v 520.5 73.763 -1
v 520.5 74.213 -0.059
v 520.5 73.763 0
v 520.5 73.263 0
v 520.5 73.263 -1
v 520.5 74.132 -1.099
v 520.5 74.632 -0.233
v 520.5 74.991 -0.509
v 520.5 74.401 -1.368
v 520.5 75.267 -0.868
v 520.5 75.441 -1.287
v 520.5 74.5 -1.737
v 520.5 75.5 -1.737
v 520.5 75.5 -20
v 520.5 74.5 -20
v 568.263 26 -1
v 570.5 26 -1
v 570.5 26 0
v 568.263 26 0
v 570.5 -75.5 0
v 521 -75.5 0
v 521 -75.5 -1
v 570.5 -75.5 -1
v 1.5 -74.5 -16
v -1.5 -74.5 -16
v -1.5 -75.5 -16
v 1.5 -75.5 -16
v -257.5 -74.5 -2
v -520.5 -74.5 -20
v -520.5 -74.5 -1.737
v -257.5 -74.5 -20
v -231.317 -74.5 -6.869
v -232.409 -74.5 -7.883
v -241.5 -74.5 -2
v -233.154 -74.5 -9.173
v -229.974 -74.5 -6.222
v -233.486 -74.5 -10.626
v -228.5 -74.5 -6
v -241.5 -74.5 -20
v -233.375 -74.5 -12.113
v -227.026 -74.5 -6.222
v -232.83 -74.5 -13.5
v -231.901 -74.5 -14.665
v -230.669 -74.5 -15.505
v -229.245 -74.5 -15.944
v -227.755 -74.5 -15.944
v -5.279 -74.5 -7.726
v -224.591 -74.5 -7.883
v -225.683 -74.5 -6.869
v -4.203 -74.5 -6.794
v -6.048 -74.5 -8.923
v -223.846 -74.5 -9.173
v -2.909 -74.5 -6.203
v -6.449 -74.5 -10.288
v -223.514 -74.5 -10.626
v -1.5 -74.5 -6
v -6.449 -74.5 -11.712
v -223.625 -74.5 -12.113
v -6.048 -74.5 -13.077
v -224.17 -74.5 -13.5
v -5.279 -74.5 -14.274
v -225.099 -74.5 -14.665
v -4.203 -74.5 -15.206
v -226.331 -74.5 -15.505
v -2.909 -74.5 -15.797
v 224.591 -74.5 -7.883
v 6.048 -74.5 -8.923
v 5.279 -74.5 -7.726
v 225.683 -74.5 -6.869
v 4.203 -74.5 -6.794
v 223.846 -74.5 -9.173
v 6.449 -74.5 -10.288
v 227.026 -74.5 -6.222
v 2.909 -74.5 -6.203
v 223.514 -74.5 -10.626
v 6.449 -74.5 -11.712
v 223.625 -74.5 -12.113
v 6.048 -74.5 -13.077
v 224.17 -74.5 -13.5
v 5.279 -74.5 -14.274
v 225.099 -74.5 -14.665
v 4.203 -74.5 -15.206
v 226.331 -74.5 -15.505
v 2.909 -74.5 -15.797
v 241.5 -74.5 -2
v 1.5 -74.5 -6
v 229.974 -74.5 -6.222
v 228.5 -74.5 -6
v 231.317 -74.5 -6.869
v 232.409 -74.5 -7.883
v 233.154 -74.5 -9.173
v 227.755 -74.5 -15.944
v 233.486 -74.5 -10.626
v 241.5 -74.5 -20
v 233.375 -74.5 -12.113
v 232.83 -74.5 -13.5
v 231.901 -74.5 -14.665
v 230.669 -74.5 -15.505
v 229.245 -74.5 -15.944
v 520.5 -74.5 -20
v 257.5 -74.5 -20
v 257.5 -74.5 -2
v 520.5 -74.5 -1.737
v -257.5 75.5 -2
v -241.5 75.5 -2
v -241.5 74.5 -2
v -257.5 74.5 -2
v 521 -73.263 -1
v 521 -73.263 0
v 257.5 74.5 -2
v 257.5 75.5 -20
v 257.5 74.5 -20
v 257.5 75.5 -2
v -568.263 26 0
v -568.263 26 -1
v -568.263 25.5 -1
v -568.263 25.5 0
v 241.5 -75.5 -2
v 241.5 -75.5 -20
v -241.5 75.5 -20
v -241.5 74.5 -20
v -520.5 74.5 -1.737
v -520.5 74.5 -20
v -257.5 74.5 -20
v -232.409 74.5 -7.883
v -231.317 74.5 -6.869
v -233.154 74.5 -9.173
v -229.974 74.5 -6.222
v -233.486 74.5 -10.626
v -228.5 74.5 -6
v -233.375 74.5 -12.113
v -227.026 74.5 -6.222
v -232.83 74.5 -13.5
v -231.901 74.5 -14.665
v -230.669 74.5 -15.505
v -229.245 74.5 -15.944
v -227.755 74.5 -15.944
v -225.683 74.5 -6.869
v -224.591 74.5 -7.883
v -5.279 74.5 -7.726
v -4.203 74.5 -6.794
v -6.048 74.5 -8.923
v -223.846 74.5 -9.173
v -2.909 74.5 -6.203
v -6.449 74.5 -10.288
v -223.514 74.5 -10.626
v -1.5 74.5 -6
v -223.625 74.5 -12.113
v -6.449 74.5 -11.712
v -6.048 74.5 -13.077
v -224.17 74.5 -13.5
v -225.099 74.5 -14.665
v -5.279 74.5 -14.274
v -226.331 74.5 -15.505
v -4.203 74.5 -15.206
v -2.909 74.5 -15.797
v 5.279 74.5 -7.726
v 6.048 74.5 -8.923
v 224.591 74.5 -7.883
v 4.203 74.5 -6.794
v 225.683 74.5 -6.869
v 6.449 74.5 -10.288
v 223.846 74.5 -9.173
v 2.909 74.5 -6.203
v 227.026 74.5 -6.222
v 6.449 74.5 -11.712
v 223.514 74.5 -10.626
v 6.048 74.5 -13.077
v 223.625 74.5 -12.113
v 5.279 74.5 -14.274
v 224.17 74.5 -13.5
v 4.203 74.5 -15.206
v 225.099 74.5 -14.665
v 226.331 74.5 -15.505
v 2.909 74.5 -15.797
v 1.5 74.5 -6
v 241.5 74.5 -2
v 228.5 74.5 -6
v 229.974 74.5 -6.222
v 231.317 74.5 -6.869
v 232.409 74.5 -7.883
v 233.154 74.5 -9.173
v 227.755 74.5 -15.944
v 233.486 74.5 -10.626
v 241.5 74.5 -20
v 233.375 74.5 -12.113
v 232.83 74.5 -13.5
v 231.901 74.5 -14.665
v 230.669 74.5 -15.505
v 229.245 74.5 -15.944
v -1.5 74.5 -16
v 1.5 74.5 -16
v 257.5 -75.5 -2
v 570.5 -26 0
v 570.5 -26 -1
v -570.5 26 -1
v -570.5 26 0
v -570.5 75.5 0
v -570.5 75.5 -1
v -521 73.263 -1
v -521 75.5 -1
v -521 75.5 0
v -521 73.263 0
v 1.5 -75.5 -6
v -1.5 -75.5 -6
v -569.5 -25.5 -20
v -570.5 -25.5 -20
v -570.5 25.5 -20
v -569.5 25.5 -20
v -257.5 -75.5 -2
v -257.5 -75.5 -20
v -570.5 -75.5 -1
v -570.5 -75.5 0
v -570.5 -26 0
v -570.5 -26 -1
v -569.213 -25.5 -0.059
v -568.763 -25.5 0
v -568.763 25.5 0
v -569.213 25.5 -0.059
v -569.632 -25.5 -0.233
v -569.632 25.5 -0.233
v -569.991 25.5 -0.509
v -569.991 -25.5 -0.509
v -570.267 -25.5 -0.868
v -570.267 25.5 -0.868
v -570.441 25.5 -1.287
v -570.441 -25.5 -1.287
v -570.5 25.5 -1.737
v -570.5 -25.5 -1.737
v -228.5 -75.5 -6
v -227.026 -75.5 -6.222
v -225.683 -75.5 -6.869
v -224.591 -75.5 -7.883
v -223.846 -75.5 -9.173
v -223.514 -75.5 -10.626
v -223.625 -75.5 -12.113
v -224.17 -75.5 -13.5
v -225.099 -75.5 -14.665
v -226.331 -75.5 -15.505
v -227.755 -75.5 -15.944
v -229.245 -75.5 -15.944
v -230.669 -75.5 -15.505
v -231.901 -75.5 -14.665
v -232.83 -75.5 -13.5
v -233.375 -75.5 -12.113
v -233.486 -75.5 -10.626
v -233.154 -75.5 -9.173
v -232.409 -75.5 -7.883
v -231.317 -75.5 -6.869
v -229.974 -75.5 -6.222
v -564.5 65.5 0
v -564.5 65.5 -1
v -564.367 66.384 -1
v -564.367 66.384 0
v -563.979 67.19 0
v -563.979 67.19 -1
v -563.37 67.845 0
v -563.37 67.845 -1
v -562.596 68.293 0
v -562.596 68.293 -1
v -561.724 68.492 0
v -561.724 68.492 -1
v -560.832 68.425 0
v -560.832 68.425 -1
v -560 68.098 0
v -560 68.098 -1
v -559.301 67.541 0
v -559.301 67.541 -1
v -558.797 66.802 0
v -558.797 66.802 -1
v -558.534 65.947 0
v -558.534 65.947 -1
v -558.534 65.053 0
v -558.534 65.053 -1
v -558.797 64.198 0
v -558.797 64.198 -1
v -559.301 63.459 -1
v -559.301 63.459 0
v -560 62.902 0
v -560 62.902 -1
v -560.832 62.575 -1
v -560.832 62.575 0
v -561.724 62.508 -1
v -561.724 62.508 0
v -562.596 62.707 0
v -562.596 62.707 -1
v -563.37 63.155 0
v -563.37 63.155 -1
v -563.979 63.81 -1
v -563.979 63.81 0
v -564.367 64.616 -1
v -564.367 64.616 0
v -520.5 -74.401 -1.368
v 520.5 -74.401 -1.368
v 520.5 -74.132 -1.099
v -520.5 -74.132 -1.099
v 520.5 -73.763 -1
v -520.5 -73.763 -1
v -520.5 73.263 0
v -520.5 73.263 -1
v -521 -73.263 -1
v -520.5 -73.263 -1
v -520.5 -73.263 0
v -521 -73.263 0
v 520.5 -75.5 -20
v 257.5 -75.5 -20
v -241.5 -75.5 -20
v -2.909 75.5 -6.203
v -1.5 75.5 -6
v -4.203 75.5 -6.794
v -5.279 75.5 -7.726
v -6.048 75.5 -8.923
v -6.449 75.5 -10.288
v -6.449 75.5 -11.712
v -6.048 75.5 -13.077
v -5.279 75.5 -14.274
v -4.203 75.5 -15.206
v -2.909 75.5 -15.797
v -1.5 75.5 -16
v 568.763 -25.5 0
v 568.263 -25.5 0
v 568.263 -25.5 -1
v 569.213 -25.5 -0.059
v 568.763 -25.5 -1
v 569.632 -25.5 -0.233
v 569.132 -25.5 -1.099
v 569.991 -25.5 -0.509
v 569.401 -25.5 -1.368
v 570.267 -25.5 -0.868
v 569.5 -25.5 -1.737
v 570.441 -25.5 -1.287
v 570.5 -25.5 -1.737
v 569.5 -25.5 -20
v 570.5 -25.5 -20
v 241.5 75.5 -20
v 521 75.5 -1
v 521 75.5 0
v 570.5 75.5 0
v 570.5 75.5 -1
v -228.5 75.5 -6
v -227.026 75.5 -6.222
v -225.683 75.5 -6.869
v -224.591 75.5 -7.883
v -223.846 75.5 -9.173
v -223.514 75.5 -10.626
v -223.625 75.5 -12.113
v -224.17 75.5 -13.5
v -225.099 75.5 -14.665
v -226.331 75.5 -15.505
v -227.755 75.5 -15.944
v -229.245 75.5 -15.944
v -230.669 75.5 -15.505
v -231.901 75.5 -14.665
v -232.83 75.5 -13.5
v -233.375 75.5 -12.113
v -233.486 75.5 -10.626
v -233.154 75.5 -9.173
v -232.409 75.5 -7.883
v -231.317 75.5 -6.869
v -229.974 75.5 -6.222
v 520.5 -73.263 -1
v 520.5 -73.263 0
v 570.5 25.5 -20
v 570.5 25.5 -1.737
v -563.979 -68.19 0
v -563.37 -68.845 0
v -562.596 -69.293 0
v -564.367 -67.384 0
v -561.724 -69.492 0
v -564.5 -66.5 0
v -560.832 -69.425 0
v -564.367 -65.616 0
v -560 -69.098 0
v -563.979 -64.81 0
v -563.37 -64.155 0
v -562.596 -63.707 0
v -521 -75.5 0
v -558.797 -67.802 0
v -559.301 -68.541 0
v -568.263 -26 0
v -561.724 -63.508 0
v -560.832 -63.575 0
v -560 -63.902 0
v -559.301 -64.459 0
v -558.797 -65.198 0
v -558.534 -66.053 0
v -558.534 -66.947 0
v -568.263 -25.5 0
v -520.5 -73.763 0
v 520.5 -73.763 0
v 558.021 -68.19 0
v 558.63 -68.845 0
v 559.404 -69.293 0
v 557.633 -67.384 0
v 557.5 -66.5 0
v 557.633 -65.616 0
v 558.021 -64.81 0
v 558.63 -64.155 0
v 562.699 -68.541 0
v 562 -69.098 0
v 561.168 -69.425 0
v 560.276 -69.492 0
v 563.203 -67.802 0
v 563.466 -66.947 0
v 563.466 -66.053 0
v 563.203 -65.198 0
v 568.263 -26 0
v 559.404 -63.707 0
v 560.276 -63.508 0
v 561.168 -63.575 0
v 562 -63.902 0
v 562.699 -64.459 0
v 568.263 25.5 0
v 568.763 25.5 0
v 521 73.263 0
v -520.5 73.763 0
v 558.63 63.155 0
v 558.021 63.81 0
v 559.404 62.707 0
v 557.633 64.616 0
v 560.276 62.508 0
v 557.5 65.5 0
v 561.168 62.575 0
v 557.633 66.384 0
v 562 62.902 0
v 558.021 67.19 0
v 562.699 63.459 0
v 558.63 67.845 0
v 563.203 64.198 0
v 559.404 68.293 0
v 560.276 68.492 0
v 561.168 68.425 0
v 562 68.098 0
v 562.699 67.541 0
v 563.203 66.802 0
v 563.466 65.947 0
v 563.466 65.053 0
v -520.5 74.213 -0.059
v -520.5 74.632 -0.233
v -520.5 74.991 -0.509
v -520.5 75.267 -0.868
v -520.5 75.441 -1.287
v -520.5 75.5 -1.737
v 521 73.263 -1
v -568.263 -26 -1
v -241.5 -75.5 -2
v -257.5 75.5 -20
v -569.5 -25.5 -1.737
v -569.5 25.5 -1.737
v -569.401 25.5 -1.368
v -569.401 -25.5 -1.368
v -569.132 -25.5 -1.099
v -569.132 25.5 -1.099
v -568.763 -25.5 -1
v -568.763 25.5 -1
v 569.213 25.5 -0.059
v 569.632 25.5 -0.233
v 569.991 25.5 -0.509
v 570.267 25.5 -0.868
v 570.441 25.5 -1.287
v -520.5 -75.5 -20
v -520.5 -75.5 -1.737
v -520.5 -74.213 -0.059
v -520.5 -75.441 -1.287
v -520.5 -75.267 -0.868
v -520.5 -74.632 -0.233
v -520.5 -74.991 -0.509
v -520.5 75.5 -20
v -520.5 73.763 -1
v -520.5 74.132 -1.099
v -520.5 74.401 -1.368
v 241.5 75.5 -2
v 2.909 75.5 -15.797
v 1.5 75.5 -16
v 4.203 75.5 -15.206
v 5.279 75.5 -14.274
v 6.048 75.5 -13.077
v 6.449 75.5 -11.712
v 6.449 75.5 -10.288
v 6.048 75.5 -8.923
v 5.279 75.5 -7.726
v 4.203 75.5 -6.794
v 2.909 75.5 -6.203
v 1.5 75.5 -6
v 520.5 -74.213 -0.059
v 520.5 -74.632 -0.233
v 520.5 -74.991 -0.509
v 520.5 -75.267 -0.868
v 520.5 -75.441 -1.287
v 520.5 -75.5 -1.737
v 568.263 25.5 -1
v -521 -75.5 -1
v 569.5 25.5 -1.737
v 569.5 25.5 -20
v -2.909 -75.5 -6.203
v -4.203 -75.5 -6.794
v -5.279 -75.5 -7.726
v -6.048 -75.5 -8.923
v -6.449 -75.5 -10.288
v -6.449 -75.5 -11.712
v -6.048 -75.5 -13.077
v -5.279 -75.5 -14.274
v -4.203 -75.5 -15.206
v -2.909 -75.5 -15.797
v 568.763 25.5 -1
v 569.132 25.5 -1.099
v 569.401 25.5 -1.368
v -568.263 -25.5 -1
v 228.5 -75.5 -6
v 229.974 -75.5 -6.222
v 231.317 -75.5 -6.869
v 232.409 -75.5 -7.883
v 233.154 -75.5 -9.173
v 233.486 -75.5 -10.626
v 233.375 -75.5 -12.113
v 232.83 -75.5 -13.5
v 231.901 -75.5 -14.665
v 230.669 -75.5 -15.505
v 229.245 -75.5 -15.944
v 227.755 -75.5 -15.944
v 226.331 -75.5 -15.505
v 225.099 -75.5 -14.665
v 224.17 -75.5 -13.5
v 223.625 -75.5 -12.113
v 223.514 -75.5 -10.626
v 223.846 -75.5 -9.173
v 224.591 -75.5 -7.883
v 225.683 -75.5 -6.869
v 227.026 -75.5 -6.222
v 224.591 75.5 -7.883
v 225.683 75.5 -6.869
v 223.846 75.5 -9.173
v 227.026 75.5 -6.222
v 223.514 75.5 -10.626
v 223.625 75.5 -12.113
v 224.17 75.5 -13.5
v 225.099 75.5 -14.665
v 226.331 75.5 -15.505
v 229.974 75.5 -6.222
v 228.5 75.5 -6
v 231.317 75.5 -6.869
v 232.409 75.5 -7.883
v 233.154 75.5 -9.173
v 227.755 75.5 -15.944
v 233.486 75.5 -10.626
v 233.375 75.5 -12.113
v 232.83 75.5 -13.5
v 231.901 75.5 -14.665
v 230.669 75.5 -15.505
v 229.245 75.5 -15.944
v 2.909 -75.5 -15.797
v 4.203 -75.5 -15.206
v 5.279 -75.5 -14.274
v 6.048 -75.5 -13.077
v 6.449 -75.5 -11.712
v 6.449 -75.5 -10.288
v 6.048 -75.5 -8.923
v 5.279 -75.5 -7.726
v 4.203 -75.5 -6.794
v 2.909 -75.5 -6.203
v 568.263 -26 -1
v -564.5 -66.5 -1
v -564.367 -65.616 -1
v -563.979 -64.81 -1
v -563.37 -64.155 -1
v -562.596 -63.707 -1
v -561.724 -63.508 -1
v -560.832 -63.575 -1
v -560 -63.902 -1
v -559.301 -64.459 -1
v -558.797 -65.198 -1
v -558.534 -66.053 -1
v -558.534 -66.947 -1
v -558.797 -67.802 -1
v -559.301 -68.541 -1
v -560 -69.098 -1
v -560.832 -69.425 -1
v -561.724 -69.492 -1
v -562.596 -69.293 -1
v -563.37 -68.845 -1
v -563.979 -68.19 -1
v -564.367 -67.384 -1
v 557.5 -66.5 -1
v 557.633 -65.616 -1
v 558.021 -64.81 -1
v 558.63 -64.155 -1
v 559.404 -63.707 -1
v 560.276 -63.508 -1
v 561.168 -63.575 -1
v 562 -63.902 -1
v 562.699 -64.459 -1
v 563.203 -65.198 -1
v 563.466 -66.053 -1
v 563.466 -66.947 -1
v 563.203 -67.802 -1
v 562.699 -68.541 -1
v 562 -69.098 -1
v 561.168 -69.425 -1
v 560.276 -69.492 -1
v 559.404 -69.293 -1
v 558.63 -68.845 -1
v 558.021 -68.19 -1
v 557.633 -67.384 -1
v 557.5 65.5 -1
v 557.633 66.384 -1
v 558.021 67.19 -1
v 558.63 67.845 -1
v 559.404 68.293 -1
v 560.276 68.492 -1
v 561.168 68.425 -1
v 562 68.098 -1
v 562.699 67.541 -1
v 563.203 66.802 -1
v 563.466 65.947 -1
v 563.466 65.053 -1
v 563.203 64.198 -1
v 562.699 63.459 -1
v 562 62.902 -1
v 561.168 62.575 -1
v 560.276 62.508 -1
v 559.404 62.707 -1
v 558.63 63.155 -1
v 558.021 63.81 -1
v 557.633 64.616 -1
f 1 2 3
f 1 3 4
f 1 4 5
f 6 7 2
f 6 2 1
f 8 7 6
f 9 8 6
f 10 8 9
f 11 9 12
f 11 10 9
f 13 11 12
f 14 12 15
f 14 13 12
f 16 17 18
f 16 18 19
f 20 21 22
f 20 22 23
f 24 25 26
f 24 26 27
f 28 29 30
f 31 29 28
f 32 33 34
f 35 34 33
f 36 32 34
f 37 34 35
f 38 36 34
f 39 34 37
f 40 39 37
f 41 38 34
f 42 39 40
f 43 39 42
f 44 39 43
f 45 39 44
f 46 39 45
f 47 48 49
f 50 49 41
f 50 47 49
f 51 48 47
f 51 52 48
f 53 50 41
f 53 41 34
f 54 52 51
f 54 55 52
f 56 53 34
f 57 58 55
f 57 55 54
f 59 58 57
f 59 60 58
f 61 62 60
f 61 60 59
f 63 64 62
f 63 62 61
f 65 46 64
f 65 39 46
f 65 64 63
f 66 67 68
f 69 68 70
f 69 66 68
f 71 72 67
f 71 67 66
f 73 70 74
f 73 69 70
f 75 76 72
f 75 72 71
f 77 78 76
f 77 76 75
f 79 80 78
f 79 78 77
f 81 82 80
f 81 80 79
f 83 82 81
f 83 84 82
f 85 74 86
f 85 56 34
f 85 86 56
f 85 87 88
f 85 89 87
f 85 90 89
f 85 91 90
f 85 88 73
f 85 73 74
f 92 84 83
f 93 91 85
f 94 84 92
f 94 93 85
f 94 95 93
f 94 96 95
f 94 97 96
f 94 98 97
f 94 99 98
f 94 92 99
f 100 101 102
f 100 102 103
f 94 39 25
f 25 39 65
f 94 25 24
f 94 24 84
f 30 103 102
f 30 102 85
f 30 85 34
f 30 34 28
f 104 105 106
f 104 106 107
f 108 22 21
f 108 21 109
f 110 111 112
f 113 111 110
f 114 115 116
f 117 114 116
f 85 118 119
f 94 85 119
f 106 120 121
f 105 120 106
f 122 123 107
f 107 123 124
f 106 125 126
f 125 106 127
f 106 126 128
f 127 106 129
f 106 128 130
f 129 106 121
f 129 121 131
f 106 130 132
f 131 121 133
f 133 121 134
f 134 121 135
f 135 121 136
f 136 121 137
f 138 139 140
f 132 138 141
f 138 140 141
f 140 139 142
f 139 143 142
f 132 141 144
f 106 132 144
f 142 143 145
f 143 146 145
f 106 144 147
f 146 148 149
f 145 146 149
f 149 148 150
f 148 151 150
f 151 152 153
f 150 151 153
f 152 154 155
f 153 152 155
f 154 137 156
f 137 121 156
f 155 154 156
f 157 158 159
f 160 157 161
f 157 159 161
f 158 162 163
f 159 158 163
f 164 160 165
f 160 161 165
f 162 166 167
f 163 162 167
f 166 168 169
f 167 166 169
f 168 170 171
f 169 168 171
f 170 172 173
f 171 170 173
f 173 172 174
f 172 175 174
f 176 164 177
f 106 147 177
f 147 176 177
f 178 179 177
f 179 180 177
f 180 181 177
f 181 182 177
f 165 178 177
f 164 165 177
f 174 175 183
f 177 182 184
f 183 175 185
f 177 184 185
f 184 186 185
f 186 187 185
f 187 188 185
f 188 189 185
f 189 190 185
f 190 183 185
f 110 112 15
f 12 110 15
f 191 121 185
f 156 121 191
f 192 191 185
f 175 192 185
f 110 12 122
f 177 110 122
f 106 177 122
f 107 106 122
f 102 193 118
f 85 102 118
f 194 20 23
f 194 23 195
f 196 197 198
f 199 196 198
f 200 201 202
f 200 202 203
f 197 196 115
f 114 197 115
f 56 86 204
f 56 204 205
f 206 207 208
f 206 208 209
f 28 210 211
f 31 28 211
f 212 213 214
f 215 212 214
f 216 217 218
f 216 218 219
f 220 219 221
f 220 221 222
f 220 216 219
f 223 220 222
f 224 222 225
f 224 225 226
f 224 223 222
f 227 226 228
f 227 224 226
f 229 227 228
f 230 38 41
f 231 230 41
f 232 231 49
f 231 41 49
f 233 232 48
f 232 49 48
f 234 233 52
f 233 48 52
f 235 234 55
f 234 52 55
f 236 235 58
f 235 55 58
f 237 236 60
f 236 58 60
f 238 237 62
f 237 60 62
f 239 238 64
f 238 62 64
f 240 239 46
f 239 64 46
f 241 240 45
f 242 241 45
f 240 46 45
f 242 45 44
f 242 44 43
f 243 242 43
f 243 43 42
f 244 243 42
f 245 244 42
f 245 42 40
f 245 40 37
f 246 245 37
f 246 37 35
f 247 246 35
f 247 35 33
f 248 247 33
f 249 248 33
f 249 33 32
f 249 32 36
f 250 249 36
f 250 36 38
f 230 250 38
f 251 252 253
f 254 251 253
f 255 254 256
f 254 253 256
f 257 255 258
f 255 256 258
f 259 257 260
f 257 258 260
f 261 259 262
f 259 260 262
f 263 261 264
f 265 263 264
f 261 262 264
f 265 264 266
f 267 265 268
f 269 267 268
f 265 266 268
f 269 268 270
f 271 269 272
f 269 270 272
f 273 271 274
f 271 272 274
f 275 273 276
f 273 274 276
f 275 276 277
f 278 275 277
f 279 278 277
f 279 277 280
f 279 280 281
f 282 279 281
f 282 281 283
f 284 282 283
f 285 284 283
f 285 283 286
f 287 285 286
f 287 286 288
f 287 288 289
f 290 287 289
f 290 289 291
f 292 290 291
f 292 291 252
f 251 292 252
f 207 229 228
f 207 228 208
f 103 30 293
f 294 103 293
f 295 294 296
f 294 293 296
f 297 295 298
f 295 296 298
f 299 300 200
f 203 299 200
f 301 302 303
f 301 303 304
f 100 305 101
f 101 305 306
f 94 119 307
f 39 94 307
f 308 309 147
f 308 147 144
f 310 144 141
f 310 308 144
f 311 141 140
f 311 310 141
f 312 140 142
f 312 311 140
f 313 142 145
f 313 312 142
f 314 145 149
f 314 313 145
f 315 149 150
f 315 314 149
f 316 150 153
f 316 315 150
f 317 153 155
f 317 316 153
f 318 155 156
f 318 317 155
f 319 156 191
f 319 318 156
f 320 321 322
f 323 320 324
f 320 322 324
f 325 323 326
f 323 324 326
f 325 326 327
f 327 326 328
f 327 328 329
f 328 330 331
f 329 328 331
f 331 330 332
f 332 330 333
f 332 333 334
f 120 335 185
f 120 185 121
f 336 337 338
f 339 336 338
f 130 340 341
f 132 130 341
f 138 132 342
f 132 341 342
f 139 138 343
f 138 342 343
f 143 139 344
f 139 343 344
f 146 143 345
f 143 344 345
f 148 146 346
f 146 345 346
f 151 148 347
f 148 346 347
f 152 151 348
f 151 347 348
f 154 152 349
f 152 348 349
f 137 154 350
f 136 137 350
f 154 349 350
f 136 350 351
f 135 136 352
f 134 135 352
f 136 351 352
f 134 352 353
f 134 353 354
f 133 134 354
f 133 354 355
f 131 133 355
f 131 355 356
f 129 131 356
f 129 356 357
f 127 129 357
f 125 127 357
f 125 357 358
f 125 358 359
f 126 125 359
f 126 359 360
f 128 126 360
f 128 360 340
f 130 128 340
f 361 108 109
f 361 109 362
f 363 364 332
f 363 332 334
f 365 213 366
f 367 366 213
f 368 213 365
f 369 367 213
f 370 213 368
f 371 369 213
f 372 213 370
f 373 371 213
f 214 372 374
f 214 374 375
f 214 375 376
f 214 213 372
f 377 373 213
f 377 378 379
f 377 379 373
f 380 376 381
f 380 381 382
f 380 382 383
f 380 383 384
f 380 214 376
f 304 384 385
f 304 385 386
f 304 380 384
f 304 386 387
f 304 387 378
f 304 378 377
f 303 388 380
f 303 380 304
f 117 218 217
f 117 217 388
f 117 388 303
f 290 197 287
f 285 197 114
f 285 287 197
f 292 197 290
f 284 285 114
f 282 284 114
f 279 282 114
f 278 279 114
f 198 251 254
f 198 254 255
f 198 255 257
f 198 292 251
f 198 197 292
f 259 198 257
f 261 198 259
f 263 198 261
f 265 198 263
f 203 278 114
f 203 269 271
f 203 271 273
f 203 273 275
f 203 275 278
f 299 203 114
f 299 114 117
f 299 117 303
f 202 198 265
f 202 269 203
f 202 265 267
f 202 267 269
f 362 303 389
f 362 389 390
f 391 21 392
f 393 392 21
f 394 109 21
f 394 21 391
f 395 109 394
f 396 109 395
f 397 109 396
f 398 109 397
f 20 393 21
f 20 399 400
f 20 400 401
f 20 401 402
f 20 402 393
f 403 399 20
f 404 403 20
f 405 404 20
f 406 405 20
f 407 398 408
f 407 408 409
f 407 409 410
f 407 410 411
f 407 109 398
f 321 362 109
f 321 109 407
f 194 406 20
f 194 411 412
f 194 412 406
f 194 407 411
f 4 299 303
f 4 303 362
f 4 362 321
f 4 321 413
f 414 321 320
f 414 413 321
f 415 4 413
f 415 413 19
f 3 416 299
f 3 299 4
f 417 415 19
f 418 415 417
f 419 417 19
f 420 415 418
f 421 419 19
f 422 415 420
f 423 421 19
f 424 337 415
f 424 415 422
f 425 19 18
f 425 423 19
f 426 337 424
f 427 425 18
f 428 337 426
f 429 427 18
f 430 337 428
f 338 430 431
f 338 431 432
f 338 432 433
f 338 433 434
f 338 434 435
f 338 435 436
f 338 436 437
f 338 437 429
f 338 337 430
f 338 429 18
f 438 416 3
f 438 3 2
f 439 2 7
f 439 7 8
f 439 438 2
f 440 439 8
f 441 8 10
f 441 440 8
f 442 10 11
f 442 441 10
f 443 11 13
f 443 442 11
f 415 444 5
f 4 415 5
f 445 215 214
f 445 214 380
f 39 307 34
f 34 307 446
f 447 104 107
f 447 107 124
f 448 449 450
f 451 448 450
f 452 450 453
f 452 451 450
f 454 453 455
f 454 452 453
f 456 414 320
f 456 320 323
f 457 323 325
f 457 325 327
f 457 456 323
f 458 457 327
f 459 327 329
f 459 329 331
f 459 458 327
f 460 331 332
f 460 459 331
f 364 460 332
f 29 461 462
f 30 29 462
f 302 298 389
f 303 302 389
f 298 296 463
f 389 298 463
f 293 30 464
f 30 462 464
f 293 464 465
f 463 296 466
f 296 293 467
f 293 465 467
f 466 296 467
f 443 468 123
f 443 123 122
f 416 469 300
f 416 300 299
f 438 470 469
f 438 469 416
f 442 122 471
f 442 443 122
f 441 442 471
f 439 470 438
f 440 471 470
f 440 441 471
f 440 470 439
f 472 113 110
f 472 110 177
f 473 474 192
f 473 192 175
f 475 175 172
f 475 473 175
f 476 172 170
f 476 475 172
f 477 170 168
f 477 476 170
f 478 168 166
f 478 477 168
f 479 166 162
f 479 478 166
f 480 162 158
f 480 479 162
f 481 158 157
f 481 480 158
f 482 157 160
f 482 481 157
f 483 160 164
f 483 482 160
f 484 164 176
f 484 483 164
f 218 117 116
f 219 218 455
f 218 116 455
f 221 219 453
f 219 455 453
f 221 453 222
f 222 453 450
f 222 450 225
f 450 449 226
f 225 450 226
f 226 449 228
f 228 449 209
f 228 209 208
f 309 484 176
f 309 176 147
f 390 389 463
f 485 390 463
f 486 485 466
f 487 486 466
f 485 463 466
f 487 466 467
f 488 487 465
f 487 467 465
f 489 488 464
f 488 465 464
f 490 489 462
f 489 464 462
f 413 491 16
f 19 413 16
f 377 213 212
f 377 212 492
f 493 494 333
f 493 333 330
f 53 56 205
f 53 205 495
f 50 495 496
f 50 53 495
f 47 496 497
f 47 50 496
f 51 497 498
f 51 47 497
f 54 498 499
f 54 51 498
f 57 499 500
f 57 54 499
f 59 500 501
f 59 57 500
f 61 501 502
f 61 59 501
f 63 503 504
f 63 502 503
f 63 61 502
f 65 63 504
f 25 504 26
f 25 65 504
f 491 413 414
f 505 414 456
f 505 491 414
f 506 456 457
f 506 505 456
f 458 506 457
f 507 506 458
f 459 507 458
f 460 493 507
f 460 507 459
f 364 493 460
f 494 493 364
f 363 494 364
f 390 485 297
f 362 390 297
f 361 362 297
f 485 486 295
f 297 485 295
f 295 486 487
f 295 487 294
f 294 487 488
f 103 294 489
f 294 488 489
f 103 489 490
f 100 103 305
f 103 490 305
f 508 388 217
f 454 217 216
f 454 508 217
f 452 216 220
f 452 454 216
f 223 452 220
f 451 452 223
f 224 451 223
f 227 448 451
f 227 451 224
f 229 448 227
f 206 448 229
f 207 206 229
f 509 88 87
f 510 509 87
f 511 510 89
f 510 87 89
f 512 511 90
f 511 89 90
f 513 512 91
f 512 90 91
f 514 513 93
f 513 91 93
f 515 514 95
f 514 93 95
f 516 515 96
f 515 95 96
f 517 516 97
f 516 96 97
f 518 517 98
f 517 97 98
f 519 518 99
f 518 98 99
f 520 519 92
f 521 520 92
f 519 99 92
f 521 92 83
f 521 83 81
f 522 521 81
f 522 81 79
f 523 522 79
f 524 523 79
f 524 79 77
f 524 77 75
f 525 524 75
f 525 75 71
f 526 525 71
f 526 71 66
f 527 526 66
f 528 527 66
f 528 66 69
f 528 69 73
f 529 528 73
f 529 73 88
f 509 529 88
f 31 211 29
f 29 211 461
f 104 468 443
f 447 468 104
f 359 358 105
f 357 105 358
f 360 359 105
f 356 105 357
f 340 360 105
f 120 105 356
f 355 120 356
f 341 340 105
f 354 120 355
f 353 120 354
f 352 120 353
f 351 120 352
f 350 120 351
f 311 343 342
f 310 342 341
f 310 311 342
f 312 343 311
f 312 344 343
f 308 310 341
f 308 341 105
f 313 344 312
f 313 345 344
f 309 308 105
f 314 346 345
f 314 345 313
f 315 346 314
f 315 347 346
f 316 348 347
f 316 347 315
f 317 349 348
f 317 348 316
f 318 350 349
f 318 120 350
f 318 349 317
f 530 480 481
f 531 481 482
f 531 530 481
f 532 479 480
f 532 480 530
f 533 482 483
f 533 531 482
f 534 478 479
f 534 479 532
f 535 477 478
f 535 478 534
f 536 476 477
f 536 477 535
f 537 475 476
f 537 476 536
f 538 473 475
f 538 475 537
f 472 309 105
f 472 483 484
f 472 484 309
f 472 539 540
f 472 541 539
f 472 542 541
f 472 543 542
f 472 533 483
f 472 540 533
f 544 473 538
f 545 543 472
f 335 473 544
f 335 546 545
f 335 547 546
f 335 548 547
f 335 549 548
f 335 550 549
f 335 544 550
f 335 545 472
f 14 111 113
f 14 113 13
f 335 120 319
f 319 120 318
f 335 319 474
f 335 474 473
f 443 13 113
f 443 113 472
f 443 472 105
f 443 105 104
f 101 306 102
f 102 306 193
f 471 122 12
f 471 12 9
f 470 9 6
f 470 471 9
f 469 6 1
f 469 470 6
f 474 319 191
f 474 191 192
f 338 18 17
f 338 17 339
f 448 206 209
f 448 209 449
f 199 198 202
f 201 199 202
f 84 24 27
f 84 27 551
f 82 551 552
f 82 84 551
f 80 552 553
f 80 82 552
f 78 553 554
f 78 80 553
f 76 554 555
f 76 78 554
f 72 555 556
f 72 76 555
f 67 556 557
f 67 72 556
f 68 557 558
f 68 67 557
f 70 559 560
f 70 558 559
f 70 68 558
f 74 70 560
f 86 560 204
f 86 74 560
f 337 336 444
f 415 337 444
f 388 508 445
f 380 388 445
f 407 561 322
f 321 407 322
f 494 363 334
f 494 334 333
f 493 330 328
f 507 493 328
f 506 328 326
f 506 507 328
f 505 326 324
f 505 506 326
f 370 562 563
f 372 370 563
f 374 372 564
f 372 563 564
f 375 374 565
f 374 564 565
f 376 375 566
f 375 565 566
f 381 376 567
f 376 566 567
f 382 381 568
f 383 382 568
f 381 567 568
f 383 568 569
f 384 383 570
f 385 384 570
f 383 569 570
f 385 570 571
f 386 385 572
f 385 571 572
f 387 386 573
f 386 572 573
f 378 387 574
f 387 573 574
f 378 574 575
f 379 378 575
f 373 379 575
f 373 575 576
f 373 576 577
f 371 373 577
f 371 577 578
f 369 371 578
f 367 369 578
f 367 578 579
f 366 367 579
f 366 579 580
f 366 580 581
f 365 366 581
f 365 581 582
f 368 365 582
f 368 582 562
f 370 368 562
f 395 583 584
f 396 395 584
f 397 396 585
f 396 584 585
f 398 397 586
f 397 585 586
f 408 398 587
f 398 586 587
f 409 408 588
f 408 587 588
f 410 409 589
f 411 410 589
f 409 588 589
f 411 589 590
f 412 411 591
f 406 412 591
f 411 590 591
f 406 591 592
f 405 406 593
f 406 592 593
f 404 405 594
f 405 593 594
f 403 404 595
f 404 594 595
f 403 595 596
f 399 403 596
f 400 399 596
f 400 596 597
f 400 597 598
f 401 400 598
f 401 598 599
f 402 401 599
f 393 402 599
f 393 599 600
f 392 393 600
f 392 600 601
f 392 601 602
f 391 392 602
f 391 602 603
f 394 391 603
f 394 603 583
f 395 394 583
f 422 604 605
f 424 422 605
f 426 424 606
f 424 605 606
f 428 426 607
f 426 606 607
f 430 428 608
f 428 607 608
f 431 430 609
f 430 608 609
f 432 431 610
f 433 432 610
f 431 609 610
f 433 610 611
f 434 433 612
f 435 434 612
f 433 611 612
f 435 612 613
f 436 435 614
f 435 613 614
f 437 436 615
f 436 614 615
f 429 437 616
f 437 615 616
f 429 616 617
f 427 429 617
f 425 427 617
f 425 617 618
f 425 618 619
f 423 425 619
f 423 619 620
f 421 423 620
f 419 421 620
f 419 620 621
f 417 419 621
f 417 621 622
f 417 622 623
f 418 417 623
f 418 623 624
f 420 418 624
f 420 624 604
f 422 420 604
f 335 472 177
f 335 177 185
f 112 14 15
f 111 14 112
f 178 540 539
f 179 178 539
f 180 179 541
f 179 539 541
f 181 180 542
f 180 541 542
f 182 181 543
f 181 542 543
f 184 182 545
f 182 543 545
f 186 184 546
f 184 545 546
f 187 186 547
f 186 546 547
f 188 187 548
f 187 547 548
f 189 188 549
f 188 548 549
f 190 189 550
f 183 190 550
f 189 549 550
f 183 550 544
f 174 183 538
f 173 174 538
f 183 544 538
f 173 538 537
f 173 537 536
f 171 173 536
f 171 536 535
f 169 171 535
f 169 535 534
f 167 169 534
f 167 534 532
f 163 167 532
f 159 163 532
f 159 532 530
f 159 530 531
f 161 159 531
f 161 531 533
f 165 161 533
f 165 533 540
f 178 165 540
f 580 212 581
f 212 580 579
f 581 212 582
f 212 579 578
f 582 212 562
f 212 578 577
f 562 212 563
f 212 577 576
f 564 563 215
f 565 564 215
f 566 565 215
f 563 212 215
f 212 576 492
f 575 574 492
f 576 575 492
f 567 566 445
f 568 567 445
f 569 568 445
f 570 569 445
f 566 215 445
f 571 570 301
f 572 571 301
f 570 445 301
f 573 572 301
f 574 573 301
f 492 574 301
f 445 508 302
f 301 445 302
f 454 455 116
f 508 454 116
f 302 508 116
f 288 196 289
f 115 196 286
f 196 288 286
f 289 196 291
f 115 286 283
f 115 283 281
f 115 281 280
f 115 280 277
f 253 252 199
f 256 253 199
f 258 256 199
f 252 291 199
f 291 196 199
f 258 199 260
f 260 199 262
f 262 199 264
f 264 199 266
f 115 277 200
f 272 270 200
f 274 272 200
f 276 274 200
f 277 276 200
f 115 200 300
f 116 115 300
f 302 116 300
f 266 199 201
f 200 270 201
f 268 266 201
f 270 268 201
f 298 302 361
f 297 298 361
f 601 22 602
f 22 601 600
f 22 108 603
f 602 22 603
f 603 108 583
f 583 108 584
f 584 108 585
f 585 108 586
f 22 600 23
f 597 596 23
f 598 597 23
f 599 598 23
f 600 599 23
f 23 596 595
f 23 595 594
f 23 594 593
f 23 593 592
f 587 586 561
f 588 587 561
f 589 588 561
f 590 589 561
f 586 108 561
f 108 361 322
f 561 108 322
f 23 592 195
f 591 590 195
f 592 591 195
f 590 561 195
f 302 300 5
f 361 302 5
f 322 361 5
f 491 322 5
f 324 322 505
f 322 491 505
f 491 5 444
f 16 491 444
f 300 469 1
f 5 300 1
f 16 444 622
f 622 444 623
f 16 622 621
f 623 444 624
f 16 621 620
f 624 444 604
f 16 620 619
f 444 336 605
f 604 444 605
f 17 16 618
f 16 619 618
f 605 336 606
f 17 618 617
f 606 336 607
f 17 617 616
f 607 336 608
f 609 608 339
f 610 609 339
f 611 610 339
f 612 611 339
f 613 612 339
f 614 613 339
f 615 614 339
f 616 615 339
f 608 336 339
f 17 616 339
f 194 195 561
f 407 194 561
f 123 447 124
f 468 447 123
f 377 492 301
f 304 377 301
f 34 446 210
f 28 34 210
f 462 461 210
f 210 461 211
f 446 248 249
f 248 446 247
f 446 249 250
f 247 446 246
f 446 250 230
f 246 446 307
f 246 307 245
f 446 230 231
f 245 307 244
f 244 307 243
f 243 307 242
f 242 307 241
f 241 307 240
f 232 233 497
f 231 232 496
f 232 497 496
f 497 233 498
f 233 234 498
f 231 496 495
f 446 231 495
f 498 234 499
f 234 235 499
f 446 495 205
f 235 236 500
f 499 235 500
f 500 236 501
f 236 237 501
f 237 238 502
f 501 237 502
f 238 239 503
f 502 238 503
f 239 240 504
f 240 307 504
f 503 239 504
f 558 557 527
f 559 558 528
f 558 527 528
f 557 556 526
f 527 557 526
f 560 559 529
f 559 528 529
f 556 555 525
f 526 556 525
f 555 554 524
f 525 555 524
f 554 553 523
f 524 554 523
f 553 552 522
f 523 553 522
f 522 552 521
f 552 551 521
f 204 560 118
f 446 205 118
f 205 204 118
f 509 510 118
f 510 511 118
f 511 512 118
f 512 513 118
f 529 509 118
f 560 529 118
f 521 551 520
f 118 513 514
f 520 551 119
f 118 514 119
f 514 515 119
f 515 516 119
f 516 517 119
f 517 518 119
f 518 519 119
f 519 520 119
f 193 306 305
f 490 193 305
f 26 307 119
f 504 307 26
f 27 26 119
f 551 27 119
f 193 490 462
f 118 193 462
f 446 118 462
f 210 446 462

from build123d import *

# Parameters (mm, degrees)
SKETCH_1_W                        = 1141
SKETCH_1_H                        = 151
SM_BASE_FLANGE_1_DEPTH            = 1
SM_EDGE_FLANGE_1_STRIP_W          = 5.4732
SM_EDGE_FLANGE_1_STRIP_H          = 1
SM_EDGE_FLANGE_1_STRIP_CUT_DEPTH  = 51
SM_EDGE_FLANGE_1_RELIEF_W         = 5.9732
SM_EDGE_FLANGE_1_RELIEF_H         = 0.5
SM_EDGE_FLANGE_1_RELIEF_CUT_DEPTH = 1
SM_EDGE_FLANGE_1_DEPTH            = 51
SM_EDGE_FLANGE_2_STRIP_W          = 5.4732
SM_EDGE_FLANGE_2_STRIP_H          = 1
SM_EDGE_FLANGE_2_STRIP_CUT_DEPTH  = 1041
SM_EDGE_FLANGE_2_RELIEF_W         = 5.9732
SM_EDGE_FLANGE_2_RELIEF_H         = 0.5
SM_EDGE_FLANGE_2_RELIEF_CUT_DEPTH = 1
SM_EDGE_FLANGE_2_DEPTH            = 1041
SM_EDGE_FLANGE_2_FLAT_DEPTH       = 1
SM_EDGE_FLANGE_4_STRIP_W          = 5.4732
SM_EDGE_FLANGE_4_STRIP_H          = 1
SM_EDGE_FLANGE_4_STRIP_CUT_DEPTH  = 51
SM_EDGE_FLANGE_4_RELIEF_W         = 5.9732
SM_EDGE_FLANGE_4_RELIEF_H         = 0.5
SM_EDGE_FLANGE_4_RELIEF_CUT_DEPTH = 1
SM_EDGE_FLANGE_4_DEPTH            = 51
SKETCH_15_R                       = 5
CUT_EXTRUDE_1_DEPTH               = 591.48391172
SKETCH_16_R                       = 3
CUT_EXTRUDE_2_DEPTH               = 576.7877213


# Sheet-metal steps are written as plain solids
with BuildPart() as part:
    # Sketch 1 → 基体-法兰1 (new body)
    with BuildSketch(Plane.XY):
        Rectangle(SKETCH_1_W, SKETCH_1_H)
    extrude(amount=-SM_BASE_FLANGE_1_DEPTH)

    # 边线-法兰1 strip (across the edge) → 边线-法兰1 strip cut (cut)
    with BuildSketch(Plane(origin=(570.5, 25.5, -1), x_dir=(-1, 0, 0), z_dir=(0, -1, 0))):
        with Locations((-1, -0.5)):
            Rectangle(SM_EDGE_FLANGE_1_STRIP_W, SM_EDGE_FLANGE_1_STRIP_H)
    extrude(amount=SM_EDGE_FLANGE_1_STRIP_CUT_DEPTH, mode=Mode.SUBTRACT)

    # 边线-法兰1 relief (on the sheet) → 边线-法兰1 relief cut (cut)
    with BuildSketch(Plane(origin=(568.7634, 25.5, -1), x_dir=(-1, 0, 0), z_dir=(0, 0, -1))):
        with Locations((-2.4866, 0.25)):
            Rectangle(SM_EDGE_FLANGE_1_RELIEF_W, SM_EDGE_FLANGE_1_RELIEF_H)
        with Locations((-2.4866, -51.25)):
            Rectangle(SM_EDGE_FLANGE_1_RELIEF_W, SM_EDGE_FLANGE_1_RELIEF_H)
    extrude(amount=-SM_EDGE_FLANGE_1_RELIEF_CUT_DEPTH, mode=Mode.SUBTRACT)

    # 边线-法兰1 section (across the edge) → 边线-法兰1 (add)
    with BuildSketch(Plane(origin=(570.5, 25.5, -1), x_dir=(-1, 0, 0), z_dir=(0, -1, 0))):
        with BuildLine():
            Line((0, 0.7366), (0, 19))
            Line((0, 19), (1, 19))
            Line((1, 19), (1, 0.7366))
            ThreePointArc((1, 0.7366), (1.215745145, 0.215745145), (1.7366, 0))
            Line((1.7366, 0), (1.7366, -1))
            ThreePointArc((1.7366, -1), (0.508638364, -0.491361636), (0, 0.7366))
        make_face()
    extrude(amount=SM_EDGE_FLANGE_1_DEPTH)

    # 边线-法兰2 strip (across the edge) → 边线-法兰2 strip cut (cut)
    with BuildSketch(Plane(origin=(-520.5, 75.5, -1), x_dir=(0, -1, 0), z_dir=(1, 0, 0))):
        with Locations((-1, -0.5)):
            Rectangle(SM_EDGE_FLANGE_2_STRIP_W, SM_EDGE_FLANGE_2_STRIP_H)
    sm_edge_flange_2_strip_cut = extrude(amount=SM_EDGE_FLANGE_2_STRIP_CUT_DEPTH, mode=Mode.SUBTRACT)

    # 边线-法兰2 relief (on the sheet) → 边线-法兰2 relief cut (cut)
    with BuildSketch(Plane(origin=(-520.5, 73.7634, -1), x_dir=(0, -1, 0), z_dir=(0, 0, -1))):
        with Locations((-2.4866, 0.25)):
            Rectangle(SM_EDGE_FLANGE_2_RELIEF_W, SM_EDGE_FLANGE_2_RELIEF_H)
        with Locations((-2.4866, -1041.25)):
            Rectangle(SM_EDGE_FLANGE_2_RELIEF_W, SM_EDGE_FLANGE_2_RELIEF_H)
    sm_edge_flange_2_relief_cut = extrude(amount=-SM_EDGE_FLANGE_2_RELIEF_CUT_DEPTH, mode=Mode.SUBTRACT)

    # 边线-法兰2 bend section (across the edge) → 边线-法兰2 (add)
    with BuildSketch(Plane(origin=(-520.5, 75.5, -1), x_dir=(0, -1, 0), z_dir=(1, 0, 0))):
        with BuildLine():
            Line((0, 0.7366), (1, 0.7366))
            ThreePointArc((1, 0.7366), (1.215745145, 0.215745145), (1.7366, 0))
            Line((1.7366, 0), (1.7366, -1))
            ThreePointArc((1.7366, -1), (0.508638364, -0.491361636), (0, 0.7366))
        make_face()
    sm_edge_flange_2 = extrude(amount=SM_EDGE_FLANGE_2_DEPTH)

    # 边线-法兰2 profile (on flange) → 边线-法兰2 flat (add)
    with BuildSketch(Plane(origin=(0, 75.5, -1), x_dir=(1, 0, 0), z_dir=(0, 1, 0))):
        Polygon((520.5, 0.7366), (520.5, 19), (257.5, 19), (257.5, 1), (241.5, 1), (241.5, 19), (-241.5, 19), (-241.5, 1), (-257.5, 1), (-257.5, 19), (-520.5, 19), (-520.5, 0.7366), align=None)
    sm_edge_flange_2_flat = extrude(amount=-SM_EDGE_FLANGE_2_FLAT_DEPTH)

    # 边线-法兰4 strip (across the edge) → 边线-法兰4 strip cut (cut)
    with BuildSketch(Plane(origin=(-570.5, -25.5, -1), x_dir=(1, 0, 0), z_dir=(0, 1, 0))):
        with Locations((-1, -0.5)):
            Rectangle(SM_EDGE_FLANGE_4_STRIP_W, SM_EDGE_FLANGE_4_STRIP_H)
    extrude(amount=SM_EDGE_FLANGE_4_STRIP_CUT_DEPTH, mode=Mode.SUBTRACT)

    # 边线-法兰4 relief (on the sheet) → 边线-法兰4 relief cut (cut)
    with BuildSketch(Plane(origin=(-568.7634, -25.5, -1), x_dir=(1, 0, 0), z_dir=(0, 0, -1))):
        with Locations((-2.4866, 0.25)):
            Rectangle(SM_EDGE_FLANGE_4_RELIEF_W, SM_EDGE_FLANGE_4_RELIEF_H)
        with Locations((-2.4866, -51.25)):
            Rectangle(SM_EDGE_FLANGE_4_RELIEF_W, SM_EDGE_FLANGE_4_RELIEF_H)
    extrude(amount=-SM_EDGE_FLANGE_4_RELIEF_CUT_DEPTH, mode=Mode.SUBTRACT)

    # 边线-法兰4 section (across the edge) → 边线-法兰4 (add)
    with BuildSketch(Plane(origin=(-570.5, -25.5, -1), x_dir=(1, 0, 0), z_dir=(0, 1, 0))):
        with BuildLine():
            Line((0, 0.7366), (0, 19))
            Line((0, 19), (1, 19))
            Line((1, 19), (1, 0.7366))
            ThreePointArc((1, 0.7366), (1.215745145, 0.215745145), (1.7366, 0))
            Line((1.7366, 0), (1.7366, -1))
            ThreePointArc((1.7366, -1), (0.508638364, -0.491361636), (0, 0.7366))
        make_face()
    extrude(amount=SM_EDGE_FLANGE_4_DEPTH)

    # 镜向1: 边线-法兰2 strip cut, 边线-法兰2 relief cut, 边线-法兰2, 边线-法兰2 flat across plane
    add(sm_edge_flange_2_strip_cut.mirror(Plane.ZX), mode=Mode.SUBTRACT)
    add(sm_edge_flange_2_relief_cut.mirror(Plane.ZX), mode=Mode.SUBTRACT)
    add(sm_edge_flange_2.mirror(Plane.ZX))
    add(sm_edge_flange_2_flat.mirror(Plane.ZX))

    # 草图15 → 切除-拉伸1 (cut, through all)
    with BuildSketch(Plane(origin=(0, 75.5, 0), x_dir=(1, 0, 0), z_dir=(0, 1, 0))):
        with Locations(Location((-228.5, 11, 0), (0, 0, 270))):
            Circle(SKETCH_15_R)
        with Locations(Location((228.5, 11, 0), (0, 0, 270))):
            Circle(SKETCH_15_R)
        with BuildLine():
            Line((-1.5, 16), (1.5, 16))
            ThreePointArc((1.5, 16), (6.5, 11), (1.5, 6))
            Line((1.5, 6), (-1.5, 6))
            ThreePointArc((-1.5, 6), (-6.5, 11), (-1.5, 16))
        make_face()
    extrude(amount=-CUT_EXTRUDE_1_DEPTH, mode=Mode.SUBTRACT)

    # 草图16 → 切除-拉伸2 (cut, through all)
    with BuildSketch(Plane(origin=(0, 0, -1), x_dir=(-1, 0, 0), z_dir=(0, 0, -1))):
        with Locations((-560.5, -66.5)):
            Circle(SKETCH_16_R)
        with Locations((-560.5, 65.5)):
            Circle(SKETCH_16_R)
        with Locations((561.5, -66.5)):
            Circle(SKETCH_16_R)
        with Locations((561.5, 65.5)):
            Circle(SKETCH_16_R)
    extrude(amount=-CUT_EXTRUDE_2_DEPTH, mode=Mode.SUBTRACT)


solid = part.part
